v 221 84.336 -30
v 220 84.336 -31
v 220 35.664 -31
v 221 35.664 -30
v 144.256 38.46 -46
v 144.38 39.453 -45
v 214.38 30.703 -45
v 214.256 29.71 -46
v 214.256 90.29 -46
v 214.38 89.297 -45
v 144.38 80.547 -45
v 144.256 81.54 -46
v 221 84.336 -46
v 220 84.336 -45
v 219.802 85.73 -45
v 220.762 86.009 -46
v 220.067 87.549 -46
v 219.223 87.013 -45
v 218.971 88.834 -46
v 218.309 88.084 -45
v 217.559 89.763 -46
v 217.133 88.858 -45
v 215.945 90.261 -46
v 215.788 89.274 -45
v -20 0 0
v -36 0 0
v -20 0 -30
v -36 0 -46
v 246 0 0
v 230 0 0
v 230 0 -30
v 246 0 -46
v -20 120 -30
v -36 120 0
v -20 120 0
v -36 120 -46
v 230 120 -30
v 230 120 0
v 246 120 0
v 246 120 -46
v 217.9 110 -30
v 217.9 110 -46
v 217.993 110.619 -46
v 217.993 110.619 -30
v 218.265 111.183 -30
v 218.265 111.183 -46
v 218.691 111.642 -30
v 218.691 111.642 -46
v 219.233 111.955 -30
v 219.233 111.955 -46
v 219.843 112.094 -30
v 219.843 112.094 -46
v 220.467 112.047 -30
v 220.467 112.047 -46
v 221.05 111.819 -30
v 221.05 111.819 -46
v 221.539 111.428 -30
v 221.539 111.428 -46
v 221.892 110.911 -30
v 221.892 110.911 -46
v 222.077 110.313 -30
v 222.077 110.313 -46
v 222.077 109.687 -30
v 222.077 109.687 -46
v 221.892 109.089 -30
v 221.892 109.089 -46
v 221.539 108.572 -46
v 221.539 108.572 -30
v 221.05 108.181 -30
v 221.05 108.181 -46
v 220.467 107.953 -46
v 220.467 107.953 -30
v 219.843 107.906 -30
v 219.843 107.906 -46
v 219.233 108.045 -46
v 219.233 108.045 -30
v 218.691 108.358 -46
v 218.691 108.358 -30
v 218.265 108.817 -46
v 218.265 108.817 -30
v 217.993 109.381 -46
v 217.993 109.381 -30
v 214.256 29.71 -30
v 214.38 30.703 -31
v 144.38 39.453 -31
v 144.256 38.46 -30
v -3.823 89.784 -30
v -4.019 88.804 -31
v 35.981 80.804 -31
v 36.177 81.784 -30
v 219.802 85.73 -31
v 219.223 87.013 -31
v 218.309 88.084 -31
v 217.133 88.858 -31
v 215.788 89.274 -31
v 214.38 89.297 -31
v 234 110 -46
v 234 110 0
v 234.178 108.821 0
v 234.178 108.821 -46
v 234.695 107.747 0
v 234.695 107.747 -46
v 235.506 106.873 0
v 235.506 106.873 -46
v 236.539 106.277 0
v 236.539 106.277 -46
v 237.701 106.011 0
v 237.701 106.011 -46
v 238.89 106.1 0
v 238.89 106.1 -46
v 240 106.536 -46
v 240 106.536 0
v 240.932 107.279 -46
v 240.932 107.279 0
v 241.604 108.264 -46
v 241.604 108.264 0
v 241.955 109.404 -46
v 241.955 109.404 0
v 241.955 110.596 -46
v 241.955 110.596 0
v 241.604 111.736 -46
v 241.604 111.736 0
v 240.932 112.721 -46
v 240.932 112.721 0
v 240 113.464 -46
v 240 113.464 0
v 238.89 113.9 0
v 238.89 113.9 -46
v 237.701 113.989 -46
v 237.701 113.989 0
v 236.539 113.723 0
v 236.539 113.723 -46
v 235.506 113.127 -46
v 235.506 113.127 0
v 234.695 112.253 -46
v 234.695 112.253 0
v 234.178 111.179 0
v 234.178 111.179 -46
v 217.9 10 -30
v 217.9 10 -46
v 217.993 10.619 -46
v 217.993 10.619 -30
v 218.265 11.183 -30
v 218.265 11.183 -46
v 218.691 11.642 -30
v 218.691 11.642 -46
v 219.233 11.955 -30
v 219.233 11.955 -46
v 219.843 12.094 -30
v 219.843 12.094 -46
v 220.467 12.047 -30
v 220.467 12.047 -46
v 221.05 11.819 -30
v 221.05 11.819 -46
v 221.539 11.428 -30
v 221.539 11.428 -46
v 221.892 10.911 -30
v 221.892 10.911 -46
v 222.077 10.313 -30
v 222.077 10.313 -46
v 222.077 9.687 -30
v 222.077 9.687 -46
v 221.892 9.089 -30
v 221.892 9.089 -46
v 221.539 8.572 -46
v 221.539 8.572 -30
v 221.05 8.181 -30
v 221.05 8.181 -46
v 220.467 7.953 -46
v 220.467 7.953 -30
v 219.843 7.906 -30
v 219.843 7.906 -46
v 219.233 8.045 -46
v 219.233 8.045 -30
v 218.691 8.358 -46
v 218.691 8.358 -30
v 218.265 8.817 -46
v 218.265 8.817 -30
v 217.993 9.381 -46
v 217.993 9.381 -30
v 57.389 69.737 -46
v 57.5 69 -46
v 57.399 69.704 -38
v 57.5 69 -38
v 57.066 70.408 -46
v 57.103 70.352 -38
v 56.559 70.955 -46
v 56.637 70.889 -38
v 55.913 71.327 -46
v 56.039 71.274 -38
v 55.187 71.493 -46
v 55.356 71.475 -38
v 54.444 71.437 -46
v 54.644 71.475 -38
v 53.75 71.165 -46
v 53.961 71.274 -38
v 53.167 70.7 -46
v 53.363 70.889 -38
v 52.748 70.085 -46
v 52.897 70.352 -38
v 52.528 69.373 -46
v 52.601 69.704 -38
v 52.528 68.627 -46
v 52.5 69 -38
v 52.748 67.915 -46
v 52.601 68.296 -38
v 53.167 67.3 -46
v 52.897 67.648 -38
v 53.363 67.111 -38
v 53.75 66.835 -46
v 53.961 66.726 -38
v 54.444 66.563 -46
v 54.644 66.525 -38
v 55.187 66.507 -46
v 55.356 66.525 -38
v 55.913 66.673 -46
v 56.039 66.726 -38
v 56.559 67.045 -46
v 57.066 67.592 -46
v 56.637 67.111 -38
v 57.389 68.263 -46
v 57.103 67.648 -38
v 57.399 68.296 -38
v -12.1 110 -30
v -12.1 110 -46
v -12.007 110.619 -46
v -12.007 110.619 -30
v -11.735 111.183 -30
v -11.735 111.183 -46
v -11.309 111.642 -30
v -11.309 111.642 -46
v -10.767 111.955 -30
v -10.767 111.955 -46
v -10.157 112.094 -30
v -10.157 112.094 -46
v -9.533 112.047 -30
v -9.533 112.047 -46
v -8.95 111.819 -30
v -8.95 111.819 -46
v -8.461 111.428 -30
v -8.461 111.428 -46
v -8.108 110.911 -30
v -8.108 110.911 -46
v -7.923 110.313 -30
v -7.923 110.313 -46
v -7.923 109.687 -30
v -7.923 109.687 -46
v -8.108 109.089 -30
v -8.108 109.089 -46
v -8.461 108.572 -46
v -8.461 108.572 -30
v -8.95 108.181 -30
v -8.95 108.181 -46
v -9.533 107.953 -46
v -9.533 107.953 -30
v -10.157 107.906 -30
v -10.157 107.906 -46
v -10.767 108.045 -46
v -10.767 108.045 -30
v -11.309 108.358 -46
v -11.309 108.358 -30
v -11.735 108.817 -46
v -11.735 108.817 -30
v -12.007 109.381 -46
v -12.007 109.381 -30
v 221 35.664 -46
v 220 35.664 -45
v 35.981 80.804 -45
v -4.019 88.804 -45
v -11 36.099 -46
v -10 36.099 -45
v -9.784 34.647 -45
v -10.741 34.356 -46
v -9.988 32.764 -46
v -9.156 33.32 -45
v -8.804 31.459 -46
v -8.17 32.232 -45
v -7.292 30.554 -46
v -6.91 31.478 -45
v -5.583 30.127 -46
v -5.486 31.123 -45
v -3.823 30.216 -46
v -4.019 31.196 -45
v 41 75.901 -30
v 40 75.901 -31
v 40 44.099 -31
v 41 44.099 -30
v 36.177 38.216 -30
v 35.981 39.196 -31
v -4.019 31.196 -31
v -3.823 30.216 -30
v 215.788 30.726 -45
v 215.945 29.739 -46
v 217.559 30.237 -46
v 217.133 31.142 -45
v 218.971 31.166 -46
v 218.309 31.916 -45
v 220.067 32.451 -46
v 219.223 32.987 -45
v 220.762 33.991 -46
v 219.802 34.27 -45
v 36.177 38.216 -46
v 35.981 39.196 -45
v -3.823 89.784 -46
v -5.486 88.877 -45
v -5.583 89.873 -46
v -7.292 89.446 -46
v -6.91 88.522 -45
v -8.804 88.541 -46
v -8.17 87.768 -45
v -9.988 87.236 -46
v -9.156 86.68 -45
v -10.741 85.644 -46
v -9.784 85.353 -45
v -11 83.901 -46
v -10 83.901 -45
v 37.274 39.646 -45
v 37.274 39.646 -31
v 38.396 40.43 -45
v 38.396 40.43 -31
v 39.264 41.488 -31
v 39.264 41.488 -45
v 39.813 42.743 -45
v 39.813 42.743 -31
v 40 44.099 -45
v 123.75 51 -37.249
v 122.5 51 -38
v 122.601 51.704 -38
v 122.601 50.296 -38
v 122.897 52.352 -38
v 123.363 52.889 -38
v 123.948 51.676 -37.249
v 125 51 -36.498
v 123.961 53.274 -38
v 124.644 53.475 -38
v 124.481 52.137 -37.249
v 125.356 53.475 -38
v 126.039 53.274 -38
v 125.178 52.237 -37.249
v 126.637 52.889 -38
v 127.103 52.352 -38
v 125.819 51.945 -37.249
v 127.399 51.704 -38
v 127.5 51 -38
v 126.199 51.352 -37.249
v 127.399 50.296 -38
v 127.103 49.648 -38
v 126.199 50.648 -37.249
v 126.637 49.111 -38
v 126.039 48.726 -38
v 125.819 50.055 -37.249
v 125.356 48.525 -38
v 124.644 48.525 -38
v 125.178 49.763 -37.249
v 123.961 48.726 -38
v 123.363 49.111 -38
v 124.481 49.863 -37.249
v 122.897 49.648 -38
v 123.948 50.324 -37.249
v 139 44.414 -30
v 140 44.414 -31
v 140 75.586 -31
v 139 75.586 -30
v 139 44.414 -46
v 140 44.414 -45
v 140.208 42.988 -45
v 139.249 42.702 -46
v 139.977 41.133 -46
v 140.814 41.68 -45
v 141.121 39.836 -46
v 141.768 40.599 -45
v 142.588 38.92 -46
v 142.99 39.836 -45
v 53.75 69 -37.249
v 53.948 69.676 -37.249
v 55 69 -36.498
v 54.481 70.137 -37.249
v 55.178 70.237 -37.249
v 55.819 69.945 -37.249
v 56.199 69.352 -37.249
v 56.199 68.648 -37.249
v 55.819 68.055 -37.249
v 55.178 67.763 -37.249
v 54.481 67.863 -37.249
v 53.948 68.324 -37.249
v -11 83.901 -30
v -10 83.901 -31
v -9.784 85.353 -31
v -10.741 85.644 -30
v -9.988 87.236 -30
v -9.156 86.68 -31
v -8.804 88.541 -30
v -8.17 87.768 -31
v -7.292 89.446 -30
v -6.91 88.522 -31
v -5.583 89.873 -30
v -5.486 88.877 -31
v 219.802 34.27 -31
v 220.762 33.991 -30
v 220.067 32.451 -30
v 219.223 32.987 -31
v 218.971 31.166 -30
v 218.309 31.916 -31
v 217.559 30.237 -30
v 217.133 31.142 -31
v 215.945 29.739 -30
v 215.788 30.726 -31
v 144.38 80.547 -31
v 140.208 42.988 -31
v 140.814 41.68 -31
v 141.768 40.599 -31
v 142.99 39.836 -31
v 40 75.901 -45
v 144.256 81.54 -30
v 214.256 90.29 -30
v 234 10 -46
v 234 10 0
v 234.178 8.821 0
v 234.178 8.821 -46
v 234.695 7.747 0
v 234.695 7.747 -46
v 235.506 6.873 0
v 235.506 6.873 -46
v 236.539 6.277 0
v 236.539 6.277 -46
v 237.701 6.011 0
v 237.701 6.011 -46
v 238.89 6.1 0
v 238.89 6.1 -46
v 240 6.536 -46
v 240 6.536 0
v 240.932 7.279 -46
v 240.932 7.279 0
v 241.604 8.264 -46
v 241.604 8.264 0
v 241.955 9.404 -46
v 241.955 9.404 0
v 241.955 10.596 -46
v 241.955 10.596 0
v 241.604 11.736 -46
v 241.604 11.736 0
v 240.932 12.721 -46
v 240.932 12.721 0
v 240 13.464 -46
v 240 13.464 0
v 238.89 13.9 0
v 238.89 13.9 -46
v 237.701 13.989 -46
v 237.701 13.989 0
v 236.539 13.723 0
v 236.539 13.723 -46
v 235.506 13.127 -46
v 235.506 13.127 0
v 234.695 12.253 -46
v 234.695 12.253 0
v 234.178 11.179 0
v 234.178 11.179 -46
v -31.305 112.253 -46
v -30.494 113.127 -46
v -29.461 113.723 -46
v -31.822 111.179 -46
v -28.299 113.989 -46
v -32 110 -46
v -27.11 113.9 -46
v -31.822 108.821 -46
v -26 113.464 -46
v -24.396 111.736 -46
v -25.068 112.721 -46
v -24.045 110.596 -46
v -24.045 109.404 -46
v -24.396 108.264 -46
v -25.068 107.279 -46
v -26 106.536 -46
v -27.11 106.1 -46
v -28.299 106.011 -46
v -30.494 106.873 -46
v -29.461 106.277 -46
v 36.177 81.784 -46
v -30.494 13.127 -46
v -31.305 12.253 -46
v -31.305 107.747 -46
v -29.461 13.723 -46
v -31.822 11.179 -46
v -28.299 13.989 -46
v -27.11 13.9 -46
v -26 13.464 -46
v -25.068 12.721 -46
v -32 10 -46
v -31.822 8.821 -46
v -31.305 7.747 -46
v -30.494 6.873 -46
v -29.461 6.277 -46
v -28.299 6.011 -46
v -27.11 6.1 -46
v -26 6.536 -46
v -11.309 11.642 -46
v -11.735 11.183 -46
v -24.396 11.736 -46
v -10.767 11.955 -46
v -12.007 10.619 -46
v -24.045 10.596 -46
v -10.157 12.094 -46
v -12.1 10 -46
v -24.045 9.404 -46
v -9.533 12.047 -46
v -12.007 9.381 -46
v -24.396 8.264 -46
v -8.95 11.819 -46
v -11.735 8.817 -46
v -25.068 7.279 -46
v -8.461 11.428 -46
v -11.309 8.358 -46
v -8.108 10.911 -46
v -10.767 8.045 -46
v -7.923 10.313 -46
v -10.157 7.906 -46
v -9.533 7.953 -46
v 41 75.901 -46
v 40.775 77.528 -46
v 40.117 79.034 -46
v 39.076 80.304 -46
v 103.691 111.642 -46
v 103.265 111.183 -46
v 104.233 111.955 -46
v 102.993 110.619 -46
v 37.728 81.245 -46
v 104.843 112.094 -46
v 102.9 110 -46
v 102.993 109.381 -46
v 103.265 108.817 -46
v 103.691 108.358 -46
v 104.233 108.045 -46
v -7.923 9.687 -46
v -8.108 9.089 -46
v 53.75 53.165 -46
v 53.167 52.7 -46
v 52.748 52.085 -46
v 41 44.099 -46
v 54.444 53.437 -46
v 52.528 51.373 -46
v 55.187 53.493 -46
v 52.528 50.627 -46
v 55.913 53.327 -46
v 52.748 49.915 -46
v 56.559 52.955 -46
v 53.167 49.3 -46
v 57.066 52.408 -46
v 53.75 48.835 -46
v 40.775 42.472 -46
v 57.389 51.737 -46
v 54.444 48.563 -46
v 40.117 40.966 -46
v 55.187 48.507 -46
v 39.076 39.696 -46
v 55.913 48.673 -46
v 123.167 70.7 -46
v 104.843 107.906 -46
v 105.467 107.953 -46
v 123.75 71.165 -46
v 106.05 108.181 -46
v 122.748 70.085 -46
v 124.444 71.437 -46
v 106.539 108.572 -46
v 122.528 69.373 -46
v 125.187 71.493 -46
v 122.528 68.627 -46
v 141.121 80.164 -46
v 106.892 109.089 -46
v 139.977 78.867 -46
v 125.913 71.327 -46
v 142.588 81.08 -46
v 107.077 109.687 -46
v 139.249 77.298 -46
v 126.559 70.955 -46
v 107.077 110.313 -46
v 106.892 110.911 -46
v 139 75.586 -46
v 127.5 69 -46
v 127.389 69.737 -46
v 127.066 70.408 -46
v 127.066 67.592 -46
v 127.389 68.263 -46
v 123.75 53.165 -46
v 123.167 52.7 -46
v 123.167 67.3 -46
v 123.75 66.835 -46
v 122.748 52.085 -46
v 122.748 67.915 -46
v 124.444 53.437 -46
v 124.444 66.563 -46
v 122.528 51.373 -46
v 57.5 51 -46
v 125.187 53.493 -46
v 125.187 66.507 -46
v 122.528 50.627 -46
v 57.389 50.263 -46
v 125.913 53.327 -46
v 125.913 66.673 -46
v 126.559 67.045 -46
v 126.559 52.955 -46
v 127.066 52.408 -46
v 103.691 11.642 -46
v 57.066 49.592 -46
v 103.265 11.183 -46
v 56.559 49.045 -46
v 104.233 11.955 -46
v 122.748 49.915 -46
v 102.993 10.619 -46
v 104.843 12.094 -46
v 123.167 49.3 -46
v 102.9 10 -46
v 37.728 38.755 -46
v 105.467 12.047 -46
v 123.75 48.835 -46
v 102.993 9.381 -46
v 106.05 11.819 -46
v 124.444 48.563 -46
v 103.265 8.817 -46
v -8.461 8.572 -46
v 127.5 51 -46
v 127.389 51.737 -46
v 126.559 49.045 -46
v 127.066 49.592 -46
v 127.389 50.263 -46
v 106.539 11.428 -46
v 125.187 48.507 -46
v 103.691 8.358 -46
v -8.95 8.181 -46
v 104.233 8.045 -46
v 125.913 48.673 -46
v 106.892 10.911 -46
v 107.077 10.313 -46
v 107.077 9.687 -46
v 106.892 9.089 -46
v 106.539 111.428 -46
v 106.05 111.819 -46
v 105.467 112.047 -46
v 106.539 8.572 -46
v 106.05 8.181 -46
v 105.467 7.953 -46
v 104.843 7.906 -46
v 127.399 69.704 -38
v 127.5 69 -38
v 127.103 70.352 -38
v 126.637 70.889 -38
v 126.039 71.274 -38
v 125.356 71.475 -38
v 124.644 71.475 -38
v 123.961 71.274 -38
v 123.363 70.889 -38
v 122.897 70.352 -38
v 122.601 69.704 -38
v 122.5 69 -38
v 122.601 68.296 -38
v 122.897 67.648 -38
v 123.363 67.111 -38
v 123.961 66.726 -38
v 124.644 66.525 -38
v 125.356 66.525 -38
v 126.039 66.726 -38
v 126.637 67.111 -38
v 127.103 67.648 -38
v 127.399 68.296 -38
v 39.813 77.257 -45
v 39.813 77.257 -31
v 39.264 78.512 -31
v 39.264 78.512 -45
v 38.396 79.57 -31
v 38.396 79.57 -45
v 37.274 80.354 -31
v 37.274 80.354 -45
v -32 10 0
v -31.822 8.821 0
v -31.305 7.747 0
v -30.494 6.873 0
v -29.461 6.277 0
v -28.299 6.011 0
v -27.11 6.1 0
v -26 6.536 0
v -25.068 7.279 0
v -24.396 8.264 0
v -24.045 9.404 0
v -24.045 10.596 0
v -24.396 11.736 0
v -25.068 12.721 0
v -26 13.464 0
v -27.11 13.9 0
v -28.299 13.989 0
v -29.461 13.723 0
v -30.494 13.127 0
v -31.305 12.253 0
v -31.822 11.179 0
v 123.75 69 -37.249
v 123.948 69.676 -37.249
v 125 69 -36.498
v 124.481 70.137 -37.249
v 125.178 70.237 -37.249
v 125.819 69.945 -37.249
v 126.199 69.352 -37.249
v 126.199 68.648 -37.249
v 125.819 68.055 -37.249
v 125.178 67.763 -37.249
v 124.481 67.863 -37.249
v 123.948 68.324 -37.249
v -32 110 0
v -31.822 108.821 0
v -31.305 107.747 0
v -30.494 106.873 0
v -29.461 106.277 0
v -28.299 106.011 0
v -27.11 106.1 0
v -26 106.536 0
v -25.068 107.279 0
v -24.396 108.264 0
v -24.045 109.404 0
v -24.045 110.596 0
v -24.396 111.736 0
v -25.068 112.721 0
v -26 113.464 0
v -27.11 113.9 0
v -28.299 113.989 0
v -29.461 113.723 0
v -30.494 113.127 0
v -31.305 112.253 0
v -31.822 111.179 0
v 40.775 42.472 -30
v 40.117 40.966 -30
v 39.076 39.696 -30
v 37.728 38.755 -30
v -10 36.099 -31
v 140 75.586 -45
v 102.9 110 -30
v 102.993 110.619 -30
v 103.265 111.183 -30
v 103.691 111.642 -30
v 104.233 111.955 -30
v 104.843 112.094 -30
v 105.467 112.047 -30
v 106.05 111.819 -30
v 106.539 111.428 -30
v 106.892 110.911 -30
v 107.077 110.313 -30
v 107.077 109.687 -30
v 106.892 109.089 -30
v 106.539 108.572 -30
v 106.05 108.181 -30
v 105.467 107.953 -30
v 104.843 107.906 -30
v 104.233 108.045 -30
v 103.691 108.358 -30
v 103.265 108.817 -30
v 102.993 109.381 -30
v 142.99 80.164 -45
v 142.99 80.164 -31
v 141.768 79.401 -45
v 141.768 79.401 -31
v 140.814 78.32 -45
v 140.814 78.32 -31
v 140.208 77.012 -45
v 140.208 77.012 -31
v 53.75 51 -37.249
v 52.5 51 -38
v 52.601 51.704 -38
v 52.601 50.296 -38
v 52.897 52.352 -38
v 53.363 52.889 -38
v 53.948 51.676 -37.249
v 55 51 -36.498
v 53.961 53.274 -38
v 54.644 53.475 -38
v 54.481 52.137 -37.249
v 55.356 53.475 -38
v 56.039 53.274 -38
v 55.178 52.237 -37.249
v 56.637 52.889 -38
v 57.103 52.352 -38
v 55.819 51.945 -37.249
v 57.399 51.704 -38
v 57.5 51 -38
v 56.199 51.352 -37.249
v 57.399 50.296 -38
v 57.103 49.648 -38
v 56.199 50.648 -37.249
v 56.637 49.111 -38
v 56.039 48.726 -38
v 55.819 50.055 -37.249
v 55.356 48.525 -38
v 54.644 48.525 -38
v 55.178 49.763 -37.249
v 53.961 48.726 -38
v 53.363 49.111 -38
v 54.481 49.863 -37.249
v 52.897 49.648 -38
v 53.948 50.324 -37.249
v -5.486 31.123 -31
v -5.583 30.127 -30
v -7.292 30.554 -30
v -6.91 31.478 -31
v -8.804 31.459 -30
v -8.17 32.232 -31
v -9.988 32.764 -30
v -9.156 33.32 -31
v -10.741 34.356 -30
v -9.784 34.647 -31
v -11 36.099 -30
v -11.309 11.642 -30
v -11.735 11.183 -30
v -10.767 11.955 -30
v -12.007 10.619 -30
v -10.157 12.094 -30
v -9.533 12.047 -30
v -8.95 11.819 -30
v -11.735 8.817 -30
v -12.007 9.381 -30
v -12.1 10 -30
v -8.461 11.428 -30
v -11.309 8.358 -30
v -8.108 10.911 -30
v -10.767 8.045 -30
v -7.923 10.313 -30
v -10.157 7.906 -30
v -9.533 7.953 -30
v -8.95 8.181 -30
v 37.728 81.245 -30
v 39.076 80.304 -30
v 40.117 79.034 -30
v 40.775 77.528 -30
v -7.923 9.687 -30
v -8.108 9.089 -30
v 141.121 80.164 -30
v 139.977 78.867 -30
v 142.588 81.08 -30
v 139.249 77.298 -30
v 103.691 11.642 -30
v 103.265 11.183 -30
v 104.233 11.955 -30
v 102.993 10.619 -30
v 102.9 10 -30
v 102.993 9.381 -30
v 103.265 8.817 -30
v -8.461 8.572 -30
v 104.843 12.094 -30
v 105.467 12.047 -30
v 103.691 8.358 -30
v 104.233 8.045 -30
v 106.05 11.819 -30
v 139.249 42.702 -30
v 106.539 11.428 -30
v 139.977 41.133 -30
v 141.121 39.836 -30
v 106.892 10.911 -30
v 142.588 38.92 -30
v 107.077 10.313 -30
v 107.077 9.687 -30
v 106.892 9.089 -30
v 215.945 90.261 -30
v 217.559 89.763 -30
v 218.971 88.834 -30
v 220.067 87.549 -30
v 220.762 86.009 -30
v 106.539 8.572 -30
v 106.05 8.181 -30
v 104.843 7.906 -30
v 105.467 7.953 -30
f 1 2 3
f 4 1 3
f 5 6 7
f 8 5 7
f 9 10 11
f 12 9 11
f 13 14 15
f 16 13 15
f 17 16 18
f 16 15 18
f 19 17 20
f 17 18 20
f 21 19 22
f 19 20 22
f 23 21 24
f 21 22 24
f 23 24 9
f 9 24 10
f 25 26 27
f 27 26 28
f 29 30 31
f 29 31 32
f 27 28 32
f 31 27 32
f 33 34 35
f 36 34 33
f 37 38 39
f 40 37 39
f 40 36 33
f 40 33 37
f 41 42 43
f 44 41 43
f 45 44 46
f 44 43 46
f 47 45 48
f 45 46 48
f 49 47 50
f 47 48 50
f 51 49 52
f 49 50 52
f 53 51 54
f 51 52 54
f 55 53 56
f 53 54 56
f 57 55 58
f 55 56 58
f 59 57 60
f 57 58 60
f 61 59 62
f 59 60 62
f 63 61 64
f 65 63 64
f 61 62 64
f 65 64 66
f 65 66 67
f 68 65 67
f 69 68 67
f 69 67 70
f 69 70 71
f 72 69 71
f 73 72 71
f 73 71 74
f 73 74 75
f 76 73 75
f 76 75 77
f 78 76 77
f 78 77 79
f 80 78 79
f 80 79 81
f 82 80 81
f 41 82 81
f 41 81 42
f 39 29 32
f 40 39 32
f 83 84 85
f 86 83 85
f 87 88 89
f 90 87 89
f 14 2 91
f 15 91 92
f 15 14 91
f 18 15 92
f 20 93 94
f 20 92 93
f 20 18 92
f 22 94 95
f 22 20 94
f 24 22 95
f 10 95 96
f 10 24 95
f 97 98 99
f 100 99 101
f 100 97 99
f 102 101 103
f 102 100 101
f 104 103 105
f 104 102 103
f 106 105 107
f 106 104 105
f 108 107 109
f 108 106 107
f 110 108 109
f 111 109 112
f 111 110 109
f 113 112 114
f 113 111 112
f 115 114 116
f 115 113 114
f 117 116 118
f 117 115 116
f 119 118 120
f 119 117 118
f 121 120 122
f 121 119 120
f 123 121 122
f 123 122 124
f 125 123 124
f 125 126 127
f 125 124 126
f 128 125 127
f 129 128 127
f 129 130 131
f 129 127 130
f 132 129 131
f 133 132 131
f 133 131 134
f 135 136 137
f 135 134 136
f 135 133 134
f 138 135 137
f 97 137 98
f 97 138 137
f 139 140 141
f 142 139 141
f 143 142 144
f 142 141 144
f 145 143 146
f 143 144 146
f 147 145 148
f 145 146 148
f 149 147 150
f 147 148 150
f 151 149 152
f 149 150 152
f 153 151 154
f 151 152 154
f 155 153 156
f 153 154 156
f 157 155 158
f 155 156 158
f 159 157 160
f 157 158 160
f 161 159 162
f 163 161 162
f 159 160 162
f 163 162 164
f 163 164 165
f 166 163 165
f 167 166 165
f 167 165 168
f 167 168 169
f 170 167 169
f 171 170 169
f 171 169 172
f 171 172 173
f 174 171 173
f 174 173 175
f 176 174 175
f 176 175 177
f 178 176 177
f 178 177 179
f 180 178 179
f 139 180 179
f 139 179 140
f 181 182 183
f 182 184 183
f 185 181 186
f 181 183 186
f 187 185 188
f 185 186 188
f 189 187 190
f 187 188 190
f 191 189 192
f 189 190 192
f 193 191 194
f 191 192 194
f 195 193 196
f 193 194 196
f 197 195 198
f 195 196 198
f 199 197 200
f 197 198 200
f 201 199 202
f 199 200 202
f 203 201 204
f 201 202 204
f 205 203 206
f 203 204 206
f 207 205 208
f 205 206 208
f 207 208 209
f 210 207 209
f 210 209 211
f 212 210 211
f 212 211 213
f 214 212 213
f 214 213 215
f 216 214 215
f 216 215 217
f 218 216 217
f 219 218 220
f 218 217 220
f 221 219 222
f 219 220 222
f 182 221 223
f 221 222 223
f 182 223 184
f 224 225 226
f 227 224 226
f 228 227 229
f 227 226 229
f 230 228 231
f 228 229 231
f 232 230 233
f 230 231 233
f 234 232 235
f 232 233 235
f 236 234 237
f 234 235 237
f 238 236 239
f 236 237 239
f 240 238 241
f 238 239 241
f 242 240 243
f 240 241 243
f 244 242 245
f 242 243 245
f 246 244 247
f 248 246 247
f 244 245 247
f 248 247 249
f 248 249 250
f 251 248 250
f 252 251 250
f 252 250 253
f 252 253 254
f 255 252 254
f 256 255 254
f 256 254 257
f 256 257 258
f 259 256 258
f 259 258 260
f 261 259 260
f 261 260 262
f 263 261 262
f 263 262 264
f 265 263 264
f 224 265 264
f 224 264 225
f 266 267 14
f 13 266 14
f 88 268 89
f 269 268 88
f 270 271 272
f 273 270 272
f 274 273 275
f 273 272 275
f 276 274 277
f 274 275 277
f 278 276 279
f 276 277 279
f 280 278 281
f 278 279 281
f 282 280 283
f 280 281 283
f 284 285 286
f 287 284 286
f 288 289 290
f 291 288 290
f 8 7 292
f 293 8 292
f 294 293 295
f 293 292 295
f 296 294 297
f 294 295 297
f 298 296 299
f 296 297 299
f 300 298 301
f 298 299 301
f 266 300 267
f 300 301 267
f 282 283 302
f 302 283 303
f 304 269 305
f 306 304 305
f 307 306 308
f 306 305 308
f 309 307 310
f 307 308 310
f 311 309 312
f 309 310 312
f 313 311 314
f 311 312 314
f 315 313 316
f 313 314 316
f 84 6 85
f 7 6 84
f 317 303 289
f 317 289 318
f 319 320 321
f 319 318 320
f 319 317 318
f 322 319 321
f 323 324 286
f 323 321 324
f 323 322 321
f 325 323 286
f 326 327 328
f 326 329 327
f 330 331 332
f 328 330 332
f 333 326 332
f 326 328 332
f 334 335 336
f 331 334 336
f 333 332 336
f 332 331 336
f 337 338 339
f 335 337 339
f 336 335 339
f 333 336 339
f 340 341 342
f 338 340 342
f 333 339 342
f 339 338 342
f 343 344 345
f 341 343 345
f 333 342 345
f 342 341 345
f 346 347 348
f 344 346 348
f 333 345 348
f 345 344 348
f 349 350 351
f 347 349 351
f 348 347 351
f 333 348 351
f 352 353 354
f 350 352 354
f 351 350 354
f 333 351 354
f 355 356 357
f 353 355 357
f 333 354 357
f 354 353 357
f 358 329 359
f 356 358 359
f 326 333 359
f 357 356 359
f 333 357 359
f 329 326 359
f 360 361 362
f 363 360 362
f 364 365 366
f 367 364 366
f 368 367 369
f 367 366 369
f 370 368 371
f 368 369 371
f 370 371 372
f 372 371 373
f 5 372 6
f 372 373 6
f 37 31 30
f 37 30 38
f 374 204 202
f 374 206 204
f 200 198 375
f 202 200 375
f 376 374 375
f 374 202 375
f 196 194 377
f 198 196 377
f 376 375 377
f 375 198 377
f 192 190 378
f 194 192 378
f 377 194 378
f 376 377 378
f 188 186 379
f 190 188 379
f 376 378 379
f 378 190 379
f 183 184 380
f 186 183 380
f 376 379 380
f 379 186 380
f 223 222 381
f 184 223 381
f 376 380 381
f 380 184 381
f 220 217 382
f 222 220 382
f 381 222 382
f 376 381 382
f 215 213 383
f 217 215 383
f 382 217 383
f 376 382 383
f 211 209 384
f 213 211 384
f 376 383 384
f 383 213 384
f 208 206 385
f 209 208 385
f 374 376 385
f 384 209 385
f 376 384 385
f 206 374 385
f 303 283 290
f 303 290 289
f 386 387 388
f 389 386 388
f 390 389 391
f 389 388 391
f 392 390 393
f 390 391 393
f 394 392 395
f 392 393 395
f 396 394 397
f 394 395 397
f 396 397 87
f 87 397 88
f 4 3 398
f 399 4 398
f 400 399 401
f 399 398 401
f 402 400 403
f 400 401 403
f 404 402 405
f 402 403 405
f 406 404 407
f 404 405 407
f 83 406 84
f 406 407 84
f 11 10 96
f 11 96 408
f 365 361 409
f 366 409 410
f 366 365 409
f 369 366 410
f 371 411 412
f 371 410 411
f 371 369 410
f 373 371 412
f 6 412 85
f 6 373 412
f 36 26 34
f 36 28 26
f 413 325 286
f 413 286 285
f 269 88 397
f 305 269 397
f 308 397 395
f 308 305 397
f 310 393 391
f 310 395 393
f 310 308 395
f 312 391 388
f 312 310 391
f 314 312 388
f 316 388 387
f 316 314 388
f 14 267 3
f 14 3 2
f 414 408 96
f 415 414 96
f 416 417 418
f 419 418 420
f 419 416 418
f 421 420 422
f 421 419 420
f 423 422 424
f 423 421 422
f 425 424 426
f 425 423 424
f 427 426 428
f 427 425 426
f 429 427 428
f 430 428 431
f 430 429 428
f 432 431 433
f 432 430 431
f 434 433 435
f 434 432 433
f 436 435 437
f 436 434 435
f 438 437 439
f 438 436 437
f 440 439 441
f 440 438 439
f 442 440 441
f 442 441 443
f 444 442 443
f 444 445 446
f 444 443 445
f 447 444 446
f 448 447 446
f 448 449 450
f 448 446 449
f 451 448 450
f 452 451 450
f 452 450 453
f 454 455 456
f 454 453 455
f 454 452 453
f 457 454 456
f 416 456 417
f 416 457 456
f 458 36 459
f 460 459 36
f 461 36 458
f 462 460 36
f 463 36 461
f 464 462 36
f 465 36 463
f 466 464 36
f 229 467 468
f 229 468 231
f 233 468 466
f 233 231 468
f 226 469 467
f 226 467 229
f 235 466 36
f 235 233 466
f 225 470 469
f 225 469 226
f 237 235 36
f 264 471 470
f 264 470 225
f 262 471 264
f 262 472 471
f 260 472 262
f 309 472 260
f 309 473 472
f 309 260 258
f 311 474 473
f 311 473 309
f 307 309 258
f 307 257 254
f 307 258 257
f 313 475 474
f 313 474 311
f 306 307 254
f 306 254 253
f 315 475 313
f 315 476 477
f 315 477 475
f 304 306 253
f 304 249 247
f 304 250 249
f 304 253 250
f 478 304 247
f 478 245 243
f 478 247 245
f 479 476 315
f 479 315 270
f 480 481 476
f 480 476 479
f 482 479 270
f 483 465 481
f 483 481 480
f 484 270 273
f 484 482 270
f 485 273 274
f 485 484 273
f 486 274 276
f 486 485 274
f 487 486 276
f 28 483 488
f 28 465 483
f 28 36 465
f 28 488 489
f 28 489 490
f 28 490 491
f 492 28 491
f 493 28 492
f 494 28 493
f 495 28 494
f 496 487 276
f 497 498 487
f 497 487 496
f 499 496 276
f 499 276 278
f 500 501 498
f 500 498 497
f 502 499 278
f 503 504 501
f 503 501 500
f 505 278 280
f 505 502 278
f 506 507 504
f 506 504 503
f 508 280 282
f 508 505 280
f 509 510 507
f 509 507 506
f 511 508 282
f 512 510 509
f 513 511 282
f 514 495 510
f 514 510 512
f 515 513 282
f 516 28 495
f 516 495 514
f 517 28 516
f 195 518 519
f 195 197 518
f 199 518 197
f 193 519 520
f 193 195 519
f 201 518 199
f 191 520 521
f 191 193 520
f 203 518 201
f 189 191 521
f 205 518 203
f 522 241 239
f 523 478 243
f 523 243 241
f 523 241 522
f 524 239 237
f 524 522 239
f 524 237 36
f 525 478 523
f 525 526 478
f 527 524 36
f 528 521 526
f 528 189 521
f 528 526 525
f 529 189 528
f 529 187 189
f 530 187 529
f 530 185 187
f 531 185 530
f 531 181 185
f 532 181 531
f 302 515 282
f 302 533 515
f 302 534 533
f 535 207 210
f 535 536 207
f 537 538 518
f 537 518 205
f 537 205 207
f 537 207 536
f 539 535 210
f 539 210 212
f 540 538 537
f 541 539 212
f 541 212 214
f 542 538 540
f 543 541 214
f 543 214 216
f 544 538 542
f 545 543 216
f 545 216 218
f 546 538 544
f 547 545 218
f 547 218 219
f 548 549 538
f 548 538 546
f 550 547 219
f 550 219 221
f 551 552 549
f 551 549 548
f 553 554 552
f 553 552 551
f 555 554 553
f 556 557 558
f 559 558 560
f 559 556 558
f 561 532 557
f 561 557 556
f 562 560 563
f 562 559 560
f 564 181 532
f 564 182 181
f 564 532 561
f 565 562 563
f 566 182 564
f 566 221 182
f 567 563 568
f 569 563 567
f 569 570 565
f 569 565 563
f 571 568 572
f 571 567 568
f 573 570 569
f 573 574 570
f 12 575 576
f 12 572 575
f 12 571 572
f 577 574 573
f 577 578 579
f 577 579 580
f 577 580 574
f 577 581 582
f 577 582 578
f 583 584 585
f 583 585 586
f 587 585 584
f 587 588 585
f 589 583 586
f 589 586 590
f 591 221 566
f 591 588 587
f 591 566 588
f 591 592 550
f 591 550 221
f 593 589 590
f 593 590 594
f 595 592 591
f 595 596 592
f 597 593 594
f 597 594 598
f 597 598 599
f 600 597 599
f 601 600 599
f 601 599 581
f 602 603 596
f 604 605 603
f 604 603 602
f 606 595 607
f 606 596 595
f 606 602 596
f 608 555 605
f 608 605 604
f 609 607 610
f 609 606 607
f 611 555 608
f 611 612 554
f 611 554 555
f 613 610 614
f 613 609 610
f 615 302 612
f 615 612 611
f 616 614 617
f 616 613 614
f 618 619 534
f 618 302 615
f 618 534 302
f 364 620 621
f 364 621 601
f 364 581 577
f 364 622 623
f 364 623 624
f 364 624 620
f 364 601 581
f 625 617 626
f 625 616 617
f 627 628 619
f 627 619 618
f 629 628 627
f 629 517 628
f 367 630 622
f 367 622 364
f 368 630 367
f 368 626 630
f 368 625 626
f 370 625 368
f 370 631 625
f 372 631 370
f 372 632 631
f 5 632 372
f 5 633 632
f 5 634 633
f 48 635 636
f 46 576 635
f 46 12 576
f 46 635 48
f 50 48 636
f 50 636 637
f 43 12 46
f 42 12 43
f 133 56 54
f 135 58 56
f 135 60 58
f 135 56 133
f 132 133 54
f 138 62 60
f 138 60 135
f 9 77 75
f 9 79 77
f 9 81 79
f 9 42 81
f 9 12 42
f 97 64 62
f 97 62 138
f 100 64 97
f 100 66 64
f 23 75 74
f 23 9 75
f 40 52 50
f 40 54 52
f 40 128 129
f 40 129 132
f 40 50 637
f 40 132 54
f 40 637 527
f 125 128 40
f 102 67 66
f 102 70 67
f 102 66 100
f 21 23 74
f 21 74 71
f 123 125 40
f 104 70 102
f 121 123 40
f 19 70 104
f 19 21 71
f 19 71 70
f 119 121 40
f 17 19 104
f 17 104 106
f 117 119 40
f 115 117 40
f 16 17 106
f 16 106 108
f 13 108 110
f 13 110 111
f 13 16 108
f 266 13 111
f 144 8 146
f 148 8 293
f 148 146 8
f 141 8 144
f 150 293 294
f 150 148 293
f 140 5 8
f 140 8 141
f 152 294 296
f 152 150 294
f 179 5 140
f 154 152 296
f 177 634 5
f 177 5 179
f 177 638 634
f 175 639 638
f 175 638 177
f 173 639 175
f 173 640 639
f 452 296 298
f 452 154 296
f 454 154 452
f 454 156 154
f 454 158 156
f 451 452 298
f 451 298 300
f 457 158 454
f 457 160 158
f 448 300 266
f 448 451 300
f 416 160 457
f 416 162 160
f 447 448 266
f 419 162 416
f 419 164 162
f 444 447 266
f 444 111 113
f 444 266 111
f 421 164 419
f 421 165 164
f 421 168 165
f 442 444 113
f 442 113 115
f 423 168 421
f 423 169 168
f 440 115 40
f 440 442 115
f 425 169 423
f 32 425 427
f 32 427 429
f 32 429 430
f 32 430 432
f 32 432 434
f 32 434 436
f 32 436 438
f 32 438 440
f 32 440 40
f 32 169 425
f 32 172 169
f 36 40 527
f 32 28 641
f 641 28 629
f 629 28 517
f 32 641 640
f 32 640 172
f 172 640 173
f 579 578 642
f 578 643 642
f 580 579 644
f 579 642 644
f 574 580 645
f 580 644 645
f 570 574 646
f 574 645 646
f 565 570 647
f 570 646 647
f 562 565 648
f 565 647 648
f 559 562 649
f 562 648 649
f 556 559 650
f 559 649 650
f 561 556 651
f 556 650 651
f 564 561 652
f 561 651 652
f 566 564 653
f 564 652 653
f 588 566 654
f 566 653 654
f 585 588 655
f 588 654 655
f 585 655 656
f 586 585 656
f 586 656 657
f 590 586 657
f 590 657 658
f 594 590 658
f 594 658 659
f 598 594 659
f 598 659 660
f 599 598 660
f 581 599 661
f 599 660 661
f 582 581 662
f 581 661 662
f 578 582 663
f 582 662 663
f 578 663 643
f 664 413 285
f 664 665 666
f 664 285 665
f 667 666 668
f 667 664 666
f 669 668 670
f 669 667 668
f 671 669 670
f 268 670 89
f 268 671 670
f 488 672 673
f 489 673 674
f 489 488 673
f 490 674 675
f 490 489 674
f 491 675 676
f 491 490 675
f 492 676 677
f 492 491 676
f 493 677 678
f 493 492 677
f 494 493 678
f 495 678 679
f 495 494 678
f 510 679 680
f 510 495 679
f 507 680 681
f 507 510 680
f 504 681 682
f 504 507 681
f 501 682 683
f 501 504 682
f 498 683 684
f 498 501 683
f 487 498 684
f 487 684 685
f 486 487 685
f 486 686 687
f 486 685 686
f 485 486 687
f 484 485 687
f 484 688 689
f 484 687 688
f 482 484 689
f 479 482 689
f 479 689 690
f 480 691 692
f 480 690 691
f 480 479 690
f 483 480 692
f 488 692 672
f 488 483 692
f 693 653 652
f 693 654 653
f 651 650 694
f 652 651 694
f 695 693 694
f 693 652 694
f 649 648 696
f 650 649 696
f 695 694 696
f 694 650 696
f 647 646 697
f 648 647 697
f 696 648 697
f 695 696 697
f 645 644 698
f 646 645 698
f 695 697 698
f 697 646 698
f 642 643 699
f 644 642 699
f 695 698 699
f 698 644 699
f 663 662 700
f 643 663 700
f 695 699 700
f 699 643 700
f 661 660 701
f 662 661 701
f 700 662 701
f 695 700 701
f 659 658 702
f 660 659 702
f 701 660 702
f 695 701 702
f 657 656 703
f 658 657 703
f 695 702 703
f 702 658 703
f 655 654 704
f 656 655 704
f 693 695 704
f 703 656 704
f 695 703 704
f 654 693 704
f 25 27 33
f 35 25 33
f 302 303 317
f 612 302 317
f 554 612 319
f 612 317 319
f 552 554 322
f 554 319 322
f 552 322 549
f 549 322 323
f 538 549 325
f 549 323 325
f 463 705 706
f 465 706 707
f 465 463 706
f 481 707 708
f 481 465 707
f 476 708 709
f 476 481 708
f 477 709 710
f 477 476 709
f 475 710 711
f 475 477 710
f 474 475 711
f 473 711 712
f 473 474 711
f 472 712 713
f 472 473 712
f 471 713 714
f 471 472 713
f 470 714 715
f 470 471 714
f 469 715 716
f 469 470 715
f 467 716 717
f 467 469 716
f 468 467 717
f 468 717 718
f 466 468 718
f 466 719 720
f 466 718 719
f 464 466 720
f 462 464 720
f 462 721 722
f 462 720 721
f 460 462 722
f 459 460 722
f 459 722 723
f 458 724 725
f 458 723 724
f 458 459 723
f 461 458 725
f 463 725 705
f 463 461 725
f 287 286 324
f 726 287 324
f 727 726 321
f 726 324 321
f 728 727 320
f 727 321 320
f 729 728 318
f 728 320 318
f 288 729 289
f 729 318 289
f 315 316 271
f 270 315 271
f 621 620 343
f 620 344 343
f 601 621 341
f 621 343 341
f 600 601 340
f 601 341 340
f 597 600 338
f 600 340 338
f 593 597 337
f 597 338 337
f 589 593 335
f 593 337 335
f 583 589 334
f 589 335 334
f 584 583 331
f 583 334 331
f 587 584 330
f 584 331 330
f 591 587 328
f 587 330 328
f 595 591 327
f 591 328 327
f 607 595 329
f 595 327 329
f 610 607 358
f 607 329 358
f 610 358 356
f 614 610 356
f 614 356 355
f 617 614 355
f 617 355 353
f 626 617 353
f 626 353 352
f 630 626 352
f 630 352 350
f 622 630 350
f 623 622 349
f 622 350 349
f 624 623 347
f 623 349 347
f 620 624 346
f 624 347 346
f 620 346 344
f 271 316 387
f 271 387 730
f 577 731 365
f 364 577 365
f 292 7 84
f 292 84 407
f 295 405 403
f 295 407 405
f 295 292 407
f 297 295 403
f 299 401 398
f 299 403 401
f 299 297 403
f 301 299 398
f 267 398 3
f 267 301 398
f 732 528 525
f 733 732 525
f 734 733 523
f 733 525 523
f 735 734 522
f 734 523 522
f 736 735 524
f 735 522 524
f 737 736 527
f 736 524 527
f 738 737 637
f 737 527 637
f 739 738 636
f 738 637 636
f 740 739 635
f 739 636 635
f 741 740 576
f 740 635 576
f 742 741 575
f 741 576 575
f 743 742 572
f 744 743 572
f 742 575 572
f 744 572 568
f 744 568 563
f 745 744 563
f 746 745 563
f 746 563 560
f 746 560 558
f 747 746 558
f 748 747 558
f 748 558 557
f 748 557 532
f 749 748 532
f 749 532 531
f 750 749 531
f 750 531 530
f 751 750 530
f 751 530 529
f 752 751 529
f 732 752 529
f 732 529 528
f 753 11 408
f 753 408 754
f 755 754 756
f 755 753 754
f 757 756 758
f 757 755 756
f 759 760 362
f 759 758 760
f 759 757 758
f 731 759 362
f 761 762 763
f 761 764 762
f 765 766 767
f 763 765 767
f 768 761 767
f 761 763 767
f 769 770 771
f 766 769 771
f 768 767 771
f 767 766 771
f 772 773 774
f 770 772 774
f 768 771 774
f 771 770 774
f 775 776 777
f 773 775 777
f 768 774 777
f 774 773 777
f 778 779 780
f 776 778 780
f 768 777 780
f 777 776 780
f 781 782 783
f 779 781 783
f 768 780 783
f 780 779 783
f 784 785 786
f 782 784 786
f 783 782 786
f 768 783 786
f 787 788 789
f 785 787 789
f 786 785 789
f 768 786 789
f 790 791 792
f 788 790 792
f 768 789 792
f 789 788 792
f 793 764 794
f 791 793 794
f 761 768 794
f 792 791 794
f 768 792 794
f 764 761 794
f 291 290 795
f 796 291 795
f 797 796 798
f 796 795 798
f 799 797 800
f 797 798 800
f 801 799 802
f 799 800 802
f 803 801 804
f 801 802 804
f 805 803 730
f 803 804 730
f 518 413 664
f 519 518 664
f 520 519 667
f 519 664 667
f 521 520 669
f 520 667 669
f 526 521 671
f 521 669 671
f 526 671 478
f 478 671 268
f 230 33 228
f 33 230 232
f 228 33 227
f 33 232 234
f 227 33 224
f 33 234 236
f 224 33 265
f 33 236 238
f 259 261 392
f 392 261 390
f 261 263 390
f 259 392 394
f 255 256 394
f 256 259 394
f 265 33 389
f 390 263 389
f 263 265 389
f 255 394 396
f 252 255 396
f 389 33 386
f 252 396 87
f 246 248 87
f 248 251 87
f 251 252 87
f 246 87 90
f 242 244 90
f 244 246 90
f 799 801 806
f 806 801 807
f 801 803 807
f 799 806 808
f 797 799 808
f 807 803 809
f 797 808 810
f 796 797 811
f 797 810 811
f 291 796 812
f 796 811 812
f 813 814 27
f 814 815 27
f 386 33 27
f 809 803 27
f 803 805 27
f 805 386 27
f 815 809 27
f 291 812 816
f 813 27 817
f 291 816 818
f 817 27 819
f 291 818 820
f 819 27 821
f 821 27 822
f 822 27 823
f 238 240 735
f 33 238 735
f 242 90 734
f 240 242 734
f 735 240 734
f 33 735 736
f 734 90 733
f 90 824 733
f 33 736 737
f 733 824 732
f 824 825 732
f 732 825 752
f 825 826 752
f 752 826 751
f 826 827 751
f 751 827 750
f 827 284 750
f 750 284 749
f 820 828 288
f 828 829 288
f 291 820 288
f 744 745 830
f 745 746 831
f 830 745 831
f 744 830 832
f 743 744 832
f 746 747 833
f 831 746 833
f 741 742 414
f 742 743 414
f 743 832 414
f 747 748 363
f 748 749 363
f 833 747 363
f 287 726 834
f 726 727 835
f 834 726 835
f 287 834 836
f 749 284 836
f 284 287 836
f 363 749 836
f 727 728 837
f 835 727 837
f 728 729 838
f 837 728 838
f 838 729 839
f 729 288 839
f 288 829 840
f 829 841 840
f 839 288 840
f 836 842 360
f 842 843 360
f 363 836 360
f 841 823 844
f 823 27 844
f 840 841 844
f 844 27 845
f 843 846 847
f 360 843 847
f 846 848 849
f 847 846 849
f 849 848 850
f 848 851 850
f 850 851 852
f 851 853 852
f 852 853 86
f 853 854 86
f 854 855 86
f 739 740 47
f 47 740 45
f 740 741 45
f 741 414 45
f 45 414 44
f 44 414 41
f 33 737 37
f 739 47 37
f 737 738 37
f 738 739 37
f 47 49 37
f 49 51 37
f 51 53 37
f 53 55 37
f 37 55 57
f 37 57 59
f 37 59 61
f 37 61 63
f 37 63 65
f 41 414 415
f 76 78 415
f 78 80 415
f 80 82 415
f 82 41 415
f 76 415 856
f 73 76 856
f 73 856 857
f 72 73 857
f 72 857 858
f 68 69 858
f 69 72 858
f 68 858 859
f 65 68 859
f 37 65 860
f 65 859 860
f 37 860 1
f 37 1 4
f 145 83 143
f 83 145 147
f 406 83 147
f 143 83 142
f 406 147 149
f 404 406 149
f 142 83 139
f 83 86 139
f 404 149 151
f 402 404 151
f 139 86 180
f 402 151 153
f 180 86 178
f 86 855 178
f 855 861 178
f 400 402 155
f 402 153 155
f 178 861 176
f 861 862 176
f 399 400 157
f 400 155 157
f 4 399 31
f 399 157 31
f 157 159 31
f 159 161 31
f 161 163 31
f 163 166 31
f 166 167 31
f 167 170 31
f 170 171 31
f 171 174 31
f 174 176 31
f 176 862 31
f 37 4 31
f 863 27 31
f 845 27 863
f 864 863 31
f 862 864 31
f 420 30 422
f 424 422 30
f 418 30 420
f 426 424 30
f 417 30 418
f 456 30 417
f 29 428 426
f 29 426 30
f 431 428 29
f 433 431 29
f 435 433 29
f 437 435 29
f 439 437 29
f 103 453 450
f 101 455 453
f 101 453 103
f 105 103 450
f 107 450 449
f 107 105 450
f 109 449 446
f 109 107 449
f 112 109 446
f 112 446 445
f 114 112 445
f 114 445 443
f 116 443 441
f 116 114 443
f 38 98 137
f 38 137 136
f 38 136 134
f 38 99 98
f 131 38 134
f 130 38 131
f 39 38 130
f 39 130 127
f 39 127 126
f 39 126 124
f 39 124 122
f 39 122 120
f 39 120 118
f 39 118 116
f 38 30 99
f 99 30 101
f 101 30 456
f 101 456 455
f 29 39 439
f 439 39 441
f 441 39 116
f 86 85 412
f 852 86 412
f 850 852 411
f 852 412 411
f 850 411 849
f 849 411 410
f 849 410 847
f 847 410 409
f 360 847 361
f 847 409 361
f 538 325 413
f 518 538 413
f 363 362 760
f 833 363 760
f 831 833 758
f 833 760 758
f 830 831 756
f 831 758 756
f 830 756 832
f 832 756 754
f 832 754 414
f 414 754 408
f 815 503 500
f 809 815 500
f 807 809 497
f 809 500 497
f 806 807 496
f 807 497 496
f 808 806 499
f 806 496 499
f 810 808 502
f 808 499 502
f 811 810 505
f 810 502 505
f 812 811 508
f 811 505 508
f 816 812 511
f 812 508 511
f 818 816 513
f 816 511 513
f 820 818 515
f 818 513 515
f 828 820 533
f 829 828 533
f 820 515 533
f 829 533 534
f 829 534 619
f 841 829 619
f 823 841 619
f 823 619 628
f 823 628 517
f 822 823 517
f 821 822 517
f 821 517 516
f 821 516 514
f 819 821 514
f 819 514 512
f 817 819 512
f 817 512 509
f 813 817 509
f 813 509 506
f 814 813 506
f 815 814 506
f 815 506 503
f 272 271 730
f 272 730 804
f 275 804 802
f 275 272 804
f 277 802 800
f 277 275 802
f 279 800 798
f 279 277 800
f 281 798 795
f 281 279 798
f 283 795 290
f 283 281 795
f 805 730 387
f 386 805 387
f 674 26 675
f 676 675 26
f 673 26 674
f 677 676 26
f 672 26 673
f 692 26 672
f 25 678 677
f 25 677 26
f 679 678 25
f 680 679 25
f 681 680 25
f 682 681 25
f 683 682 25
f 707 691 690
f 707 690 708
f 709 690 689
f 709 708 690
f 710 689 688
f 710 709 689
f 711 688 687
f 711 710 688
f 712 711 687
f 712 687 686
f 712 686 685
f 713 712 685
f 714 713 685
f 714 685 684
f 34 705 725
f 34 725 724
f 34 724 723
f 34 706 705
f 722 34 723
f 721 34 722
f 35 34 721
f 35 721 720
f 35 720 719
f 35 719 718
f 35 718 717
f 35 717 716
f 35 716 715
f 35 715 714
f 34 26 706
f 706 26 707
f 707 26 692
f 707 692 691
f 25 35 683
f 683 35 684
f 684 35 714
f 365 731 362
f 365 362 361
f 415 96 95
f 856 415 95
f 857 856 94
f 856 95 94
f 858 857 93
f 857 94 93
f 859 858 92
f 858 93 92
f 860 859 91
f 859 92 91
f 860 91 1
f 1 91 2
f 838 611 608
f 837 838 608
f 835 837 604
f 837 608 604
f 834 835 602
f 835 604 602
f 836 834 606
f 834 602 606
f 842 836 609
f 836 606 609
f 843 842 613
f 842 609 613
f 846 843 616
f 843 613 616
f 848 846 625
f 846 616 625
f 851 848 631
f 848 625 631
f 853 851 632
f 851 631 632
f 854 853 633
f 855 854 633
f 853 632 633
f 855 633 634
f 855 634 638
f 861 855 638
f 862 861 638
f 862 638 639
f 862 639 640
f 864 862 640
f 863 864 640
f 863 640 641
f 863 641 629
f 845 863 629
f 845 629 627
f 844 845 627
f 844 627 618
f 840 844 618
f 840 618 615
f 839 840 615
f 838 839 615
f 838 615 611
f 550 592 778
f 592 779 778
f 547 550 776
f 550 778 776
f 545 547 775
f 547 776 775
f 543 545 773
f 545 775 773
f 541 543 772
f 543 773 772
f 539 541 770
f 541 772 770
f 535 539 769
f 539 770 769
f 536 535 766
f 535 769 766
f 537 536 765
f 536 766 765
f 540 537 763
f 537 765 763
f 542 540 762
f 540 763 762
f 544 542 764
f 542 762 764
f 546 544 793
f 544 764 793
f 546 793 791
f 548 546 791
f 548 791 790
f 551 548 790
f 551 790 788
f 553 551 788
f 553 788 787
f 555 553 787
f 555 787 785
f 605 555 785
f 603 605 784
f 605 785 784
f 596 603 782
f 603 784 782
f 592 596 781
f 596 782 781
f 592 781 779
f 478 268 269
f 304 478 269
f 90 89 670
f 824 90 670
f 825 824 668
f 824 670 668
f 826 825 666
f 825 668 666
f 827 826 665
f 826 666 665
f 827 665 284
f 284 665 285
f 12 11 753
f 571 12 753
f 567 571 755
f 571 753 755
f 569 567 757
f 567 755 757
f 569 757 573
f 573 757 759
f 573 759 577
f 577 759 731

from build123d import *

# Parameters (mm, degrees)
SKETCH1_W                   = 282
SKETCH1_H                   = 16
BOSS_EXTRUDE1_DEPTH         = 120
SKETCH4_W                   = 16
SKETCH4_H                   = 120
BOSS_EXTRUDE2_DEPTH         = 30
SKETCH2_R                   = 4
CUT_EXTRUDE1_DEPTH          = 278.546392518
M5_TAPPED_HOLE1_D           = 4.2
TAP_DRILL_FOR_M6_TAP1_D     = 5
TAP_DRILL_FOR_M6_TAP1_DEPTH = 8
TAP_DRILL_FOR_M6_TAP1_TIP   = 1.502151548
CUT_EXTRUDE2_DEPTH          = 278.546392518
CHAMFER1_SIZE               = 1


with BuildPart() as part:
    # Sketch1 → Boss-Extrude1 (new body)
    with BuildSketch(Plane(origin=(0, 0, 0), x_dir=(1, 0, 0), z_dir=(0, 1, 0))):
        with Locations((105, 38)):
            Rectangle(SKETCH1_W, SKETCH1_H)
    extrude(amount=BOSS_EXTRUDE1_DEPTH)

    # Sketch4 → Boss-Extrude2 (add)
    with BuildSketch(Plane.XY.offset(-30)):
        with Locations((-28, 60)):
            Rectangle(SKETCH4_W, SKETCH4_H)
        with Locations((238, 60)):
            Rectangle(SKETCH4_W, SKETCH4_H)
    extrude(amount=BOSS_EXTRUDE2_DEPTH)

    # Sketch2 → Cut-Extrude1 (cut, through all)
    with BuildSketch(Plane.XY.offset(-46)):
        with Locations(Location((238, 110, 0), (0, 0, 180))):
            Circle(SKETCH2_R)
        with Locations(Location((-28, 110, 0), (0, 0, 180))):
            Circle(SKETCH2_R)
        with Locations(Location((-28, 10, 0), (0, 0, 180))):
            Circle(SKETCH2_R)
        with Locations(Location((238, 10, 0), (0, 0, 180))):
            Circle(SKETCH2_R)
    extrude(amount=CUT_EXTRUDE1_DEPTH, mode=Mode.SUBTRACT)

    # M5 Tapped Hole1 (through all)
    with Locations(Plane.XY.offset(-30)):
        with Locations((-10, 110), (105, 110), (220, 110), (220, 10), (105, 10), (-10, 10)):
            Hole(M5_TAPPED_HOLE1_D / 2)

    # Tap Drill for M6 Tap1
    with Locations(Plane(origin=(0, 0, -46), x_dir=(-1, 0, 0), z_dir=(0, 0, -1))):
        with Locations((-55, 51), (-55, 69), (-125, 69), (-125, 51)):
            Hole(TAP_DRILL_FOR_M6_TAP1_D / 2, depth=TAP_DRILL_FOR_M6_TAP1_DEPTH)
            with Locations((0, 0, -(TAP_DRILL_FOR_M6_TAP1_DEPTH + TAP_DRILL_FOR_M6_TAP1_TIP / 2))):  # 118° drill point
                Cone(0, TAP_DRILL_FOR_M6_TAP1_D / 2, TAP_DRILL_FOR_M6_TAP1_TIP, mode=Mode.SUBTRACT)

    # Sketch11 → Cut-Extrude2 (cut, through all)
    with BuildSketch(Plane(origin=(0, 0, -46), x_dir=(-1, 0, 0), z_dir=(0, 0, -1))):
        with BuildLine():
            Line((-140, 75.586088907), (-140, 44.413911093))
            ThreePointArc((-140, 44.413911093), (-141.251609121, 41.104898277), (-144.379826327, 39.452521709))
            Line((-144.379826327, 39.452521709), (-214.379826327, 30.702521709))
            ThreePointArc((-214.379826327, 30.702521709), (-218.309012816, 31.915520214), (-220, 35.663911093))
            Line((-220, 35.663911093), (-220, 84.336088907))
            ThreePointArc((-220, 84.336088907), (-218.309012816, 88.084479786), (-214.379826327, 89.297478291))
            Line((-214.379826327, 89.297478291), (-144.379826327, 80.547478291))
            ThreePointArc((-144.379826327, 80.547478291), (-141.251609121, 78.895101723), (-140, 75.586088907))
        make_face()
        with BuildLine():
            Line((10, 83.900980486), (10, 36.099019514))
            ThreePointArc((10, 36.099019514), (8.169944528, 32.232308807), (4.019419324, 31.196116135))
            Line((4.019419324, 31.196116135), (-35.980580676, 39.196116135))
            ThreePointArc((-35.980580676, 39.196116135), (-38.866710707, 40.929074986), (-40, 44.099019514))
            Line((-40, 44.099019514), (-40, 75.900980486))
            ThreePointArc((-40, 75.900980486), (-38.866710707, 79.070925014), (-35.980580676, 80.803883865))
            Line((-35.980580676, 80.803883865), (4.019419324, 88.803883865))
            ThreePointArc((4.019419324, 88.803883865), (8.169944528, 87.767691193), (10, 83.900980486))
        make_face()
    extrude(amount=-CUT_EXTRUDE2_DEPTH, mode=Mode.SUBTRACT)

    # Chamfer1
    chamfer1_edges = [part.edges().sort_by_distance(p)[0] for p in [
        (141.251609121, 41.104898277, -30),
        (179.379826327, 35.077521709, -30),
        (218.309012816, 31.915520214, -30),
        (220, 60, -30),
        (218.309012816, 88.084479786, -30),
        (179.379826327, 84.922478291, -30),
        (141.251609121, 78.895101723, -30),
        (140, 60, -30),
        (141.251609121, 41.104898277, -46),
        (140, 60, -46),
        (141.251609121, 78.895101723, -46),
        (179.379826327, 84.922478291, -46),
        (218.309012816, 88.084479786, -46),
        (220, 60, -46),
        (218.309012816, 31.915520214, -46),
        (179.379826327, 35.077521709, -46),
        (-8.169944528, 32.232308807, -30),
        (15.980580676, 35.196116135, -30),
        (38.866710707, 40.929074986, -30),
        (40, 60, -30),
        (38.866710707, 79.070925014, -30),
        (15.980580676, 84.803883865, -30),
        (-8.169944528, 87.767691193, -30),
        (-10, 60, -30),
        (-8.169944528, 32.232308807, -46),
        (-10, 60, -46),
        (-8.169944528, 87.767691193, -46),
        (15.980580676, 84.803883865, -46),
        (38.866710707, 79.070925014, -46),
        (40, 60, -46),
        (38.866710707, 40.929074986, -46),
        (15.980580676, 35.196116135, -46),
    ]]
    chamfer(chamfer1_edges, length=CHAMFER1_SIZE)


solid = part.part
